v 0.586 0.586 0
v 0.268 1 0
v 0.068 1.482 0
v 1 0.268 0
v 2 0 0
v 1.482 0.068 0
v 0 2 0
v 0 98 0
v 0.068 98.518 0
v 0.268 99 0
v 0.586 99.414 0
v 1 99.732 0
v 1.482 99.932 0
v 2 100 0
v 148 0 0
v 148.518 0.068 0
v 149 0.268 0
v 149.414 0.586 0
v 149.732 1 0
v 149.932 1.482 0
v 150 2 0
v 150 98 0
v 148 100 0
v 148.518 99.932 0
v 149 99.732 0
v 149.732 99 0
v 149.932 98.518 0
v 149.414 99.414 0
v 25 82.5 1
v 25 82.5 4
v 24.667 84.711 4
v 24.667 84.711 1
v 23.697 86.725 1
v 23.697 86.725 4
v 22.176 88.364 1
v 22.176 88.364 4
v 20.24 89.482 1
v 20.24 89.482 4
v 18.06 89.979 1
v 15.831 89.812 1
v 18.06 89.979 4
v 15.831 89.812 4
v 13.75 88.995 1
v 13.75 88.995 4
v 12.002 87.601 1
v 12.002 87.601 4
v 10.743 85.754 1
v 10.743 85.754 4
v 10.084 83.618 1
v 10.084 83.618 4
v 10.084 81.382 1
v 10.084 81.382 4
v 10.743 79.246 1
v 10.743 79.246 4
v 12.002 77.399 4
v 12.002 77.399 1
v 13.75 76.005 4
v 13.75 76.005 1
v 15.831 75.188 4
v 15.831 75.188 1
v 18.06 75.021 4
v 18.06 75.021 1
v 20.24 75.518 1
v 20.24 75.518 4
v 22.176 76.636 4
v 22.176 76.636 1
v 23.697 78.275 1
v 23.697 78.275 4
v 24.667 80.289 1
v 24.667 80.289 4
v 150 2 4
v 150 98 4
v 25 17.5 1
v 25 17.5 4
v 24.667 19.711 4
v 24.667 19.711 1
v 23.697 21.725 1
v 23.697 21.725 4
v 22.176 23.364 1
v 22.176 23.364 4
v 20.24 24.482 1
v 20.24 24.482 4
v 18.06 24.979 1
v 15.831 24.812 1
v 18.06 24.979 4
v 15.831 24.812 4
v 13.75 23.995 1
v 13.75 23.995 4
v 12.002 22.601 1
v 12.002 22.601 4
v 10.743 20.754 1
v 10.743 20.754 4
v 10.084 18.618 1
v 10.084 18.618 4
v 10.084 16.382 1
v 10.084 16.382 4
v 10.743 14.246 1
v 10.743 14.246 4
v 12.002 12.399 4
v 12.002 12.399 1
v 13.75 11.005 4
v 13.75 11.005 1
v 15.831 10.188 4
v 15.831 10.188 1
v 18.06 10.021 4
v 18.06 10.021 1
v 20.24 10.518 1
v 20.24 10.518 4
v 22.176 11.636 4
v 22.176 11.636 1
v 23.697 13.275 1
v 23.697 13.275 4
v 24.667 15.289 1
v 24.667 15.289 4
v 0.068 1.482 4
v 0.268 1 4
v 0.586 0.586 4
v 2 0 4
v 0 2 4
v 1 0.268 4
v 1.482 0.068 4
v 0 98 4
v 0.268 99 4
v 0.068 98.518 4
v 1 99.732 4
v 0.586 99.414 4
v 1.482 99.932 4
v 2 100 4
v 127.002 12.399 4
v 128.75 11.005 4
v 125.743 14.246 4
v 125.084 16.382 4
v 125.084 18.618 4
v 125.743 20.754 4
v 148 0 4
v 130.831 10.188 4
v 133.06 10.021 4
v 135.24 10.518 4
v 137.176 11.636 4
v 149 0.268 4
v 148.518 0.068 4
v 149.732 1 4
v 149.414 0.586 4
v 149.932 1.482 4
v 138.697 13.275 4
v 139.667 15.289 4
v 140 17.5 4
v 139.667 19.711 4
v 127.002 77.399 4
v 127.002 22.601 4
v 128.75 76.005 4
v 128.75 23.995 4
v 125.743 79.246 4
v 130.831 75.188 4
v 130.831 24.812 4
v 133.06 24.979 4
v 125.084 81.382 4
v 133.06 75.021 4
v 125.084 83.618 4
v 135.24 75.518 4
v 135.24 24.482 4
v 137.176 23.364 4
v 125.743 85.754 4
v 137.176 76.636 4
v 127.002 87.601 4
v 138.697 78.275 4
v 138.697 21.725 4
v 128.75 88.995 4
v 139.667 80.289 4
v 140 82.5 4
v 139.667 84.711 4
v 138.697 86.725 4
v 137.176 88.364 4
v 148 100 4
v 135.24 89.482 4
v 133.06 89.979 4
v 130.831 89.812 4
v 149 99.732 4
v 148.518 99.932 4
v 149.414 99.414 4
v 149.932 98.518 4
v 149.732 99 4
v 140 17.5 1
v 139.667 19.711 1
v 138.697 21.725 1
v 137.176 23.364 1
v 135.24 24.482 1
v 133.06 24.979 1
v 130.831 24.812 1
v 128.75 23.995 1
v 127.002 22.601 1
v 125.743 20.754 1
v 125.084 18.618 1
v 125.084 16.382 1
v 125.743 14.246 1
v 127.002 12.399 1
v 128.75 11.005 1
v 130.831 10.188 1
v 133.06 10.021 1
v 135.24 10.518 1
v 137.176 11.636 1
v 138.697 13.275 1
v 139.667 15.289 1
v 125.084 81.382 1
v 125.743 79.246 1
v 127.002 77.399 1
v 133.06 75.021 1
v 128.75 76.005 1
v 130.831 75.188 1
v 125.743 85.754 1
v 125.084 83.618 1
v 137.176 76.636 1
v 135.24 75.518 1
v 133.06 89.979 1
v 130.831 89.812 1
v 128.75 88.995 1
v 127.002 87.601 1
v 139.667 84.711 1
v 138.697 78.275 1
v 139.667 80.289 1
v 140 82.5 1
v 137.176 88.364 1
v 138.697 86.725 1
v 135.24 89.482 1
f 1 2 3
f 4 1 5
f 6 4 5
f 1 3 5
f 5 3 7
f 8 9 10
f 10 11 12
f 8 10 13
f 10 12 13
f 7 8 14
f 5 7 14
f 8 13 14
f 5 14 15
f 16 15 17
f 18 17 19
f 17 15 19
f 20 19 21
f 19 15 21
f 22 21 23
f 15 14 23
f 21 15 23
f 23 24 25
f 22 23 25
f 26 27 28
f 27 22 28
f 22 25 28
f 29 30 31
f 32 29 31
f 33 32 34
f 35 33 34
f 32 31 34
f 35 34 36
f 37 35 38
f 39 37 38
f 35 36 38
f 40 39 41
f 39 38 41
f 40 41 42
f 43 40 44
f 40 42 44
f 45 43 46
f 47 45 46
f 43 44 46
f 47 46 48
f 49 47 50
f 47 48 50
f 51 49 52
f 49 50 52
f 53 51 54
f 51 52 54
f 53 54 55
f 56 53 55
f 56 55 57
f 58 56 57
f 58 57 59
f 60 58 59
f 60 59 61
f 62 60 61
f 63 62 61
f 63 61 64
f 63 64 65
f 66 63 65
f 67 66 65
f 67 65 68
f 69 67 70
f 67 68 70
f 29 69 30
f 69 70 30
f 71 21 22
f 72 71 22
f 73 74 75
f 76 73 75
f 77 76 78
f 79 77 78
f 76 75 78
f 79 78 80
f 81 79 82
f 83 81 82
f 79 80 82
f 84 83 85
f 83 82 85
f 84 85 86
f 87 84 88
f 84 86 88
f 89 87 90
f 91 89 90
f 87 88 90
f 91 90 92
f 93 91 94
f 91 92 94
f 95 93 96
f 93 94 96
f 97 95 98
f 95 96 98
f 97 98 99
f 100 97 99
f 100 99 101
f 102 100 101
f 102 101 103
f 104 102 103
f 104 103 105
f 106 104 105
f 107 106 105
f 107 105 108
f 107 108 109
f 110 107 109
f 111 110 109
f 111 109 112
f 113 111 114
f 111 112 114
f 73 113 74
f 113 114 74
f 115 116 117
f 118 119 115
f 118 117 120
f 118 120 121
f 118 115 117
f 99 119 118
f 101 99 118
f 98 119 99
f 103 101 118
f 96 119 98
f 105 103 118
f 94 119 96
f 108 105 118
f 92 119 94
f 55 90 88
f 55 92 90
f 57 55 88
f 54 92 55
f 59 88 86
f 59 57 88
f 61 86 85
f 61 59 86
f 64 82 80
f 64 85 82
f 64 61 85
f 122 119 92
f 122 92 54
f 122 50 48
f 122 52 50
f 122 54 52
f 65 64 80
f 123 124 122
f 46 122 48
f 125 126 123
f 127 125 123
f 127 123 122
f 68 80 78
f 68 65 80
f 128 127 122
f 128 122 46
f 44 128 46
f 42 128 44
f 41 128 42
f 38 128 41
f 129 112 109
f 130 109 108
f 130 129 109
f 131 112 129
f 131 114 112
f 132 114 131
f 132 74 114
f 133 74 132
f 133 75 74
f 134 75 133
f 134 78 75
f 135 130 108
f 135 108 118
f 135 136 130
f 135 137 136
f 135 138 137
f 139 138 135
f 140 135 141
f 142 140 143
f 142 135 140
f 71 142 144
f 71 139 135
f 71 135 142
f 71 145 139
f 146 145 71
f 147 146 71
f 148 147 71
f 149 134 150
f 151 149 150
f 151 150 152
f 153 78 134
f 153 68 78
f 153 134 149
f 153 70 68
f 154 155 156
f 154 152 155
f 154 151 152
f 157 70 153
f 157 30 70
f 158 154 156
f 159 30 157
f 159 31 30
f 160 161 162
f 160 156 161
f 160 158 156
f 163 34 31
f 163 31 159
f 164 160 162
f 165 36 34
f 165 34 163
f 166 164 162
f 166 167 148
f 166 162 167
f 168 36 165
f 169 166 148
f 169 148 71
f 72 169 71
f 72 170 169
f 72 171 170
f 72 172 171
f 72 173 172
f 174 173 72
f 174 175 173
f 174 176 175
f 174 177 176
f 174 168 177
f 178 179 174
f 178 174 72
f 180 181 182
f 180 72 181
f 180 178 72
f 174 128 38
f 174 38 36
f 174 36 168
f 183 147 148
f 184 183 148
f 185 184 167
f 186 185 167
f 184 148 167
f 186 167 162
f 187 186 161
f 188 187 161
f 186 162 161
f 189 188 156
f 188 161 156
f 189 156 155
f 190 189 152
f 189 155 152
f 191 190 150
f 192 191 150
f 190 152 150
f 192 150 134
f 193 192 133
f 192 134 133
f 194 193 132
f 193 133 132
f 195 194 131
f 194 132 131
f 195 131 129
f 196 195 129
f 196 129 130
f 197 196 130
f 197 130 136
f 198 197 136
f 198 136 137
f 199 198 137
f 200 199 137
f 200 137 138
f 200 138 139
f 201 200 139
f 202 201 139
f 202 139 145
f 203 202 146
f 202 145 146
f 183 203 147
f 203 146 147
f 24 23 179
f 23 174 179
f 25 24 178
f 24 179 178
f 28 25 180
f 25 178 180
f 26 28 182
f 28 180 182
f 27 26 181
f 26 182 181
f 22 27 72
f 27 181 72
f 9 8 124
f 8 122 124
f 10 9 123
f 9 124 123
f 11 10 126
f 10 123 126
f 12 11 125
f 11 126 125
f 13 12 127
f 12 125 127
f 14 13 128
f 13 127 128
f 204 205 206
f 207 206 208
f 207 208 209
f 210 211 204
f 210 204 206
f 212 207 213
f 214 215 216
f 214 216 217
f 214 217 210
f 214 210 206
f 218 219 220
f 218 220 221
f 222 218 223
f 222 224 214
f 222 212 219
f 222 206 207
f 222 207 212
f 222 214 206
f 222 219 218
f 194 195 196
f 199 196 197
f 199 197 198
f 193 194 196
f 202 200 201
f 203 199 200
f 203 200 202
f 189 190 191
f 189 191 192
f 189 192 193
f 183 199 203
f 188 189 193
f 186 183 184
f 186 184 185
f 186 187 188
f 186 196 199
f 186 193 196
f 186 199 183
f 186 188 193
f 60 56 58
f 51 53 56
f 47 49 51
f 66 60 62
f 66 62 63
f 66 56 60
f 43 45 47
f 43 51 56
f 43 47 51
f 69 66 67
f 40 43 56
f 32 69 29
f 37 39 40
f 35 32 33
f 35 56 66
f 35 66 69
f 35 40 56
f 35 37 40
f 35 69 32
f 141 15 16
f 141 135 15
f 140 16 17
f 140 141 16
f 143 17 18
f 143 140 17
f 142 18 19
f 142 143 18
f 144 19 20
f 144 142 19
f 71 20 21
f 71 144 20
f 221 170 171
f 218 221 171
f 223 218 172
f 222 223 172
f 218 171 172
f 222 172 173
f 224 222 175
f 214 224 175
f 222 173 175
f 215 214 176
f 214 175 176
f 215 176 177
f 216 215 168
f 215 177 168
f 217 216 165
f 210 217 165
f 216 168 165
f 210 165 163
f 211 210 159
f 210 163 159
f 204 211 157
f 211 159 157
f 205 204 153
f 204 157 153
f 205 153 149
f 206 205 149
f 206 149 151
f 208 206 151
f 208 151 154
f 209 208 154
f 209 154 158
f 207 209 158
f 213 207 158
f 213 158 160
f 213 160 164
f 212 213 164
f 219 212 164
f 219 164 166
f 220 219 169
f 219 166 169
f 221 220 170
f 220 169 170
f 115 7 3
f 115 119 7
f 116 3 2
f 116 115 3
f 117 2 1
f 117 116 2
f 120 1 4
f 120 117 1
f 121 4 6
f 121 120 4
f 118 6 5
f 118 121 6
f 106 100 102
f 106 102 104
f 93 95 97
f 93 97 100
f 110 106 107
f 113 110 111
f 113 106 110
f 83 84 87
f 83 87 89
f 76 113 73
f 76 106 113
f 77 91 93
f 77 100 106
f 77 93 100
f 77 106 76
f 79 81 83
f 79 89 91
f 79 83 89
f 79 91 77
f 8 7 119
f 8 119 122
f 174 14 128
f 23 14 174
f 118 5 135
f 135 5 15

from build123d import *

# Parameters (mm, degrees)
F0_W     = 150
F0_H     = 100
F1_DEPTH = 4
F2_R     = 7.5
F3_DEPTH = 3
F4_R     = 2


with BuildPart() as f1:
    # F0 (on Top) → F1 (new body)
    with BuildSketch(Plane.XY):
        with Locations((75, 50)):
            Rectangle(F0_W, F0_H)
    extrude(amount=F1_DEPTH)

    # F2 (on face) → F3 (cut)
    with BuildSketch(Plane.XY.offset(4)):
        with Locations((17.5, 82.5)):
            Circle(F2_R)
        with Locations((132.5, 82.5)):
            Circle(F2_R)
        with Locations((132.5, 17.5)):
            Circle(F2_R)
        with Locations((17.5, 17.5)):
            Circle(F2_R)
    extrude(amount=-F3_DEPTH, mode=Mode.SUBTRACT)

    # F4
    f4_edges = [f1.edges().sort_by_distance(p)[0] for p in [
        (0, 0, 2),
        (0, 100, 2),
        (150, 100, 2),
        (150, 0, 2),
    ]]
    fillet(f4_edges, radius=F4_R)


solid = f1.part
